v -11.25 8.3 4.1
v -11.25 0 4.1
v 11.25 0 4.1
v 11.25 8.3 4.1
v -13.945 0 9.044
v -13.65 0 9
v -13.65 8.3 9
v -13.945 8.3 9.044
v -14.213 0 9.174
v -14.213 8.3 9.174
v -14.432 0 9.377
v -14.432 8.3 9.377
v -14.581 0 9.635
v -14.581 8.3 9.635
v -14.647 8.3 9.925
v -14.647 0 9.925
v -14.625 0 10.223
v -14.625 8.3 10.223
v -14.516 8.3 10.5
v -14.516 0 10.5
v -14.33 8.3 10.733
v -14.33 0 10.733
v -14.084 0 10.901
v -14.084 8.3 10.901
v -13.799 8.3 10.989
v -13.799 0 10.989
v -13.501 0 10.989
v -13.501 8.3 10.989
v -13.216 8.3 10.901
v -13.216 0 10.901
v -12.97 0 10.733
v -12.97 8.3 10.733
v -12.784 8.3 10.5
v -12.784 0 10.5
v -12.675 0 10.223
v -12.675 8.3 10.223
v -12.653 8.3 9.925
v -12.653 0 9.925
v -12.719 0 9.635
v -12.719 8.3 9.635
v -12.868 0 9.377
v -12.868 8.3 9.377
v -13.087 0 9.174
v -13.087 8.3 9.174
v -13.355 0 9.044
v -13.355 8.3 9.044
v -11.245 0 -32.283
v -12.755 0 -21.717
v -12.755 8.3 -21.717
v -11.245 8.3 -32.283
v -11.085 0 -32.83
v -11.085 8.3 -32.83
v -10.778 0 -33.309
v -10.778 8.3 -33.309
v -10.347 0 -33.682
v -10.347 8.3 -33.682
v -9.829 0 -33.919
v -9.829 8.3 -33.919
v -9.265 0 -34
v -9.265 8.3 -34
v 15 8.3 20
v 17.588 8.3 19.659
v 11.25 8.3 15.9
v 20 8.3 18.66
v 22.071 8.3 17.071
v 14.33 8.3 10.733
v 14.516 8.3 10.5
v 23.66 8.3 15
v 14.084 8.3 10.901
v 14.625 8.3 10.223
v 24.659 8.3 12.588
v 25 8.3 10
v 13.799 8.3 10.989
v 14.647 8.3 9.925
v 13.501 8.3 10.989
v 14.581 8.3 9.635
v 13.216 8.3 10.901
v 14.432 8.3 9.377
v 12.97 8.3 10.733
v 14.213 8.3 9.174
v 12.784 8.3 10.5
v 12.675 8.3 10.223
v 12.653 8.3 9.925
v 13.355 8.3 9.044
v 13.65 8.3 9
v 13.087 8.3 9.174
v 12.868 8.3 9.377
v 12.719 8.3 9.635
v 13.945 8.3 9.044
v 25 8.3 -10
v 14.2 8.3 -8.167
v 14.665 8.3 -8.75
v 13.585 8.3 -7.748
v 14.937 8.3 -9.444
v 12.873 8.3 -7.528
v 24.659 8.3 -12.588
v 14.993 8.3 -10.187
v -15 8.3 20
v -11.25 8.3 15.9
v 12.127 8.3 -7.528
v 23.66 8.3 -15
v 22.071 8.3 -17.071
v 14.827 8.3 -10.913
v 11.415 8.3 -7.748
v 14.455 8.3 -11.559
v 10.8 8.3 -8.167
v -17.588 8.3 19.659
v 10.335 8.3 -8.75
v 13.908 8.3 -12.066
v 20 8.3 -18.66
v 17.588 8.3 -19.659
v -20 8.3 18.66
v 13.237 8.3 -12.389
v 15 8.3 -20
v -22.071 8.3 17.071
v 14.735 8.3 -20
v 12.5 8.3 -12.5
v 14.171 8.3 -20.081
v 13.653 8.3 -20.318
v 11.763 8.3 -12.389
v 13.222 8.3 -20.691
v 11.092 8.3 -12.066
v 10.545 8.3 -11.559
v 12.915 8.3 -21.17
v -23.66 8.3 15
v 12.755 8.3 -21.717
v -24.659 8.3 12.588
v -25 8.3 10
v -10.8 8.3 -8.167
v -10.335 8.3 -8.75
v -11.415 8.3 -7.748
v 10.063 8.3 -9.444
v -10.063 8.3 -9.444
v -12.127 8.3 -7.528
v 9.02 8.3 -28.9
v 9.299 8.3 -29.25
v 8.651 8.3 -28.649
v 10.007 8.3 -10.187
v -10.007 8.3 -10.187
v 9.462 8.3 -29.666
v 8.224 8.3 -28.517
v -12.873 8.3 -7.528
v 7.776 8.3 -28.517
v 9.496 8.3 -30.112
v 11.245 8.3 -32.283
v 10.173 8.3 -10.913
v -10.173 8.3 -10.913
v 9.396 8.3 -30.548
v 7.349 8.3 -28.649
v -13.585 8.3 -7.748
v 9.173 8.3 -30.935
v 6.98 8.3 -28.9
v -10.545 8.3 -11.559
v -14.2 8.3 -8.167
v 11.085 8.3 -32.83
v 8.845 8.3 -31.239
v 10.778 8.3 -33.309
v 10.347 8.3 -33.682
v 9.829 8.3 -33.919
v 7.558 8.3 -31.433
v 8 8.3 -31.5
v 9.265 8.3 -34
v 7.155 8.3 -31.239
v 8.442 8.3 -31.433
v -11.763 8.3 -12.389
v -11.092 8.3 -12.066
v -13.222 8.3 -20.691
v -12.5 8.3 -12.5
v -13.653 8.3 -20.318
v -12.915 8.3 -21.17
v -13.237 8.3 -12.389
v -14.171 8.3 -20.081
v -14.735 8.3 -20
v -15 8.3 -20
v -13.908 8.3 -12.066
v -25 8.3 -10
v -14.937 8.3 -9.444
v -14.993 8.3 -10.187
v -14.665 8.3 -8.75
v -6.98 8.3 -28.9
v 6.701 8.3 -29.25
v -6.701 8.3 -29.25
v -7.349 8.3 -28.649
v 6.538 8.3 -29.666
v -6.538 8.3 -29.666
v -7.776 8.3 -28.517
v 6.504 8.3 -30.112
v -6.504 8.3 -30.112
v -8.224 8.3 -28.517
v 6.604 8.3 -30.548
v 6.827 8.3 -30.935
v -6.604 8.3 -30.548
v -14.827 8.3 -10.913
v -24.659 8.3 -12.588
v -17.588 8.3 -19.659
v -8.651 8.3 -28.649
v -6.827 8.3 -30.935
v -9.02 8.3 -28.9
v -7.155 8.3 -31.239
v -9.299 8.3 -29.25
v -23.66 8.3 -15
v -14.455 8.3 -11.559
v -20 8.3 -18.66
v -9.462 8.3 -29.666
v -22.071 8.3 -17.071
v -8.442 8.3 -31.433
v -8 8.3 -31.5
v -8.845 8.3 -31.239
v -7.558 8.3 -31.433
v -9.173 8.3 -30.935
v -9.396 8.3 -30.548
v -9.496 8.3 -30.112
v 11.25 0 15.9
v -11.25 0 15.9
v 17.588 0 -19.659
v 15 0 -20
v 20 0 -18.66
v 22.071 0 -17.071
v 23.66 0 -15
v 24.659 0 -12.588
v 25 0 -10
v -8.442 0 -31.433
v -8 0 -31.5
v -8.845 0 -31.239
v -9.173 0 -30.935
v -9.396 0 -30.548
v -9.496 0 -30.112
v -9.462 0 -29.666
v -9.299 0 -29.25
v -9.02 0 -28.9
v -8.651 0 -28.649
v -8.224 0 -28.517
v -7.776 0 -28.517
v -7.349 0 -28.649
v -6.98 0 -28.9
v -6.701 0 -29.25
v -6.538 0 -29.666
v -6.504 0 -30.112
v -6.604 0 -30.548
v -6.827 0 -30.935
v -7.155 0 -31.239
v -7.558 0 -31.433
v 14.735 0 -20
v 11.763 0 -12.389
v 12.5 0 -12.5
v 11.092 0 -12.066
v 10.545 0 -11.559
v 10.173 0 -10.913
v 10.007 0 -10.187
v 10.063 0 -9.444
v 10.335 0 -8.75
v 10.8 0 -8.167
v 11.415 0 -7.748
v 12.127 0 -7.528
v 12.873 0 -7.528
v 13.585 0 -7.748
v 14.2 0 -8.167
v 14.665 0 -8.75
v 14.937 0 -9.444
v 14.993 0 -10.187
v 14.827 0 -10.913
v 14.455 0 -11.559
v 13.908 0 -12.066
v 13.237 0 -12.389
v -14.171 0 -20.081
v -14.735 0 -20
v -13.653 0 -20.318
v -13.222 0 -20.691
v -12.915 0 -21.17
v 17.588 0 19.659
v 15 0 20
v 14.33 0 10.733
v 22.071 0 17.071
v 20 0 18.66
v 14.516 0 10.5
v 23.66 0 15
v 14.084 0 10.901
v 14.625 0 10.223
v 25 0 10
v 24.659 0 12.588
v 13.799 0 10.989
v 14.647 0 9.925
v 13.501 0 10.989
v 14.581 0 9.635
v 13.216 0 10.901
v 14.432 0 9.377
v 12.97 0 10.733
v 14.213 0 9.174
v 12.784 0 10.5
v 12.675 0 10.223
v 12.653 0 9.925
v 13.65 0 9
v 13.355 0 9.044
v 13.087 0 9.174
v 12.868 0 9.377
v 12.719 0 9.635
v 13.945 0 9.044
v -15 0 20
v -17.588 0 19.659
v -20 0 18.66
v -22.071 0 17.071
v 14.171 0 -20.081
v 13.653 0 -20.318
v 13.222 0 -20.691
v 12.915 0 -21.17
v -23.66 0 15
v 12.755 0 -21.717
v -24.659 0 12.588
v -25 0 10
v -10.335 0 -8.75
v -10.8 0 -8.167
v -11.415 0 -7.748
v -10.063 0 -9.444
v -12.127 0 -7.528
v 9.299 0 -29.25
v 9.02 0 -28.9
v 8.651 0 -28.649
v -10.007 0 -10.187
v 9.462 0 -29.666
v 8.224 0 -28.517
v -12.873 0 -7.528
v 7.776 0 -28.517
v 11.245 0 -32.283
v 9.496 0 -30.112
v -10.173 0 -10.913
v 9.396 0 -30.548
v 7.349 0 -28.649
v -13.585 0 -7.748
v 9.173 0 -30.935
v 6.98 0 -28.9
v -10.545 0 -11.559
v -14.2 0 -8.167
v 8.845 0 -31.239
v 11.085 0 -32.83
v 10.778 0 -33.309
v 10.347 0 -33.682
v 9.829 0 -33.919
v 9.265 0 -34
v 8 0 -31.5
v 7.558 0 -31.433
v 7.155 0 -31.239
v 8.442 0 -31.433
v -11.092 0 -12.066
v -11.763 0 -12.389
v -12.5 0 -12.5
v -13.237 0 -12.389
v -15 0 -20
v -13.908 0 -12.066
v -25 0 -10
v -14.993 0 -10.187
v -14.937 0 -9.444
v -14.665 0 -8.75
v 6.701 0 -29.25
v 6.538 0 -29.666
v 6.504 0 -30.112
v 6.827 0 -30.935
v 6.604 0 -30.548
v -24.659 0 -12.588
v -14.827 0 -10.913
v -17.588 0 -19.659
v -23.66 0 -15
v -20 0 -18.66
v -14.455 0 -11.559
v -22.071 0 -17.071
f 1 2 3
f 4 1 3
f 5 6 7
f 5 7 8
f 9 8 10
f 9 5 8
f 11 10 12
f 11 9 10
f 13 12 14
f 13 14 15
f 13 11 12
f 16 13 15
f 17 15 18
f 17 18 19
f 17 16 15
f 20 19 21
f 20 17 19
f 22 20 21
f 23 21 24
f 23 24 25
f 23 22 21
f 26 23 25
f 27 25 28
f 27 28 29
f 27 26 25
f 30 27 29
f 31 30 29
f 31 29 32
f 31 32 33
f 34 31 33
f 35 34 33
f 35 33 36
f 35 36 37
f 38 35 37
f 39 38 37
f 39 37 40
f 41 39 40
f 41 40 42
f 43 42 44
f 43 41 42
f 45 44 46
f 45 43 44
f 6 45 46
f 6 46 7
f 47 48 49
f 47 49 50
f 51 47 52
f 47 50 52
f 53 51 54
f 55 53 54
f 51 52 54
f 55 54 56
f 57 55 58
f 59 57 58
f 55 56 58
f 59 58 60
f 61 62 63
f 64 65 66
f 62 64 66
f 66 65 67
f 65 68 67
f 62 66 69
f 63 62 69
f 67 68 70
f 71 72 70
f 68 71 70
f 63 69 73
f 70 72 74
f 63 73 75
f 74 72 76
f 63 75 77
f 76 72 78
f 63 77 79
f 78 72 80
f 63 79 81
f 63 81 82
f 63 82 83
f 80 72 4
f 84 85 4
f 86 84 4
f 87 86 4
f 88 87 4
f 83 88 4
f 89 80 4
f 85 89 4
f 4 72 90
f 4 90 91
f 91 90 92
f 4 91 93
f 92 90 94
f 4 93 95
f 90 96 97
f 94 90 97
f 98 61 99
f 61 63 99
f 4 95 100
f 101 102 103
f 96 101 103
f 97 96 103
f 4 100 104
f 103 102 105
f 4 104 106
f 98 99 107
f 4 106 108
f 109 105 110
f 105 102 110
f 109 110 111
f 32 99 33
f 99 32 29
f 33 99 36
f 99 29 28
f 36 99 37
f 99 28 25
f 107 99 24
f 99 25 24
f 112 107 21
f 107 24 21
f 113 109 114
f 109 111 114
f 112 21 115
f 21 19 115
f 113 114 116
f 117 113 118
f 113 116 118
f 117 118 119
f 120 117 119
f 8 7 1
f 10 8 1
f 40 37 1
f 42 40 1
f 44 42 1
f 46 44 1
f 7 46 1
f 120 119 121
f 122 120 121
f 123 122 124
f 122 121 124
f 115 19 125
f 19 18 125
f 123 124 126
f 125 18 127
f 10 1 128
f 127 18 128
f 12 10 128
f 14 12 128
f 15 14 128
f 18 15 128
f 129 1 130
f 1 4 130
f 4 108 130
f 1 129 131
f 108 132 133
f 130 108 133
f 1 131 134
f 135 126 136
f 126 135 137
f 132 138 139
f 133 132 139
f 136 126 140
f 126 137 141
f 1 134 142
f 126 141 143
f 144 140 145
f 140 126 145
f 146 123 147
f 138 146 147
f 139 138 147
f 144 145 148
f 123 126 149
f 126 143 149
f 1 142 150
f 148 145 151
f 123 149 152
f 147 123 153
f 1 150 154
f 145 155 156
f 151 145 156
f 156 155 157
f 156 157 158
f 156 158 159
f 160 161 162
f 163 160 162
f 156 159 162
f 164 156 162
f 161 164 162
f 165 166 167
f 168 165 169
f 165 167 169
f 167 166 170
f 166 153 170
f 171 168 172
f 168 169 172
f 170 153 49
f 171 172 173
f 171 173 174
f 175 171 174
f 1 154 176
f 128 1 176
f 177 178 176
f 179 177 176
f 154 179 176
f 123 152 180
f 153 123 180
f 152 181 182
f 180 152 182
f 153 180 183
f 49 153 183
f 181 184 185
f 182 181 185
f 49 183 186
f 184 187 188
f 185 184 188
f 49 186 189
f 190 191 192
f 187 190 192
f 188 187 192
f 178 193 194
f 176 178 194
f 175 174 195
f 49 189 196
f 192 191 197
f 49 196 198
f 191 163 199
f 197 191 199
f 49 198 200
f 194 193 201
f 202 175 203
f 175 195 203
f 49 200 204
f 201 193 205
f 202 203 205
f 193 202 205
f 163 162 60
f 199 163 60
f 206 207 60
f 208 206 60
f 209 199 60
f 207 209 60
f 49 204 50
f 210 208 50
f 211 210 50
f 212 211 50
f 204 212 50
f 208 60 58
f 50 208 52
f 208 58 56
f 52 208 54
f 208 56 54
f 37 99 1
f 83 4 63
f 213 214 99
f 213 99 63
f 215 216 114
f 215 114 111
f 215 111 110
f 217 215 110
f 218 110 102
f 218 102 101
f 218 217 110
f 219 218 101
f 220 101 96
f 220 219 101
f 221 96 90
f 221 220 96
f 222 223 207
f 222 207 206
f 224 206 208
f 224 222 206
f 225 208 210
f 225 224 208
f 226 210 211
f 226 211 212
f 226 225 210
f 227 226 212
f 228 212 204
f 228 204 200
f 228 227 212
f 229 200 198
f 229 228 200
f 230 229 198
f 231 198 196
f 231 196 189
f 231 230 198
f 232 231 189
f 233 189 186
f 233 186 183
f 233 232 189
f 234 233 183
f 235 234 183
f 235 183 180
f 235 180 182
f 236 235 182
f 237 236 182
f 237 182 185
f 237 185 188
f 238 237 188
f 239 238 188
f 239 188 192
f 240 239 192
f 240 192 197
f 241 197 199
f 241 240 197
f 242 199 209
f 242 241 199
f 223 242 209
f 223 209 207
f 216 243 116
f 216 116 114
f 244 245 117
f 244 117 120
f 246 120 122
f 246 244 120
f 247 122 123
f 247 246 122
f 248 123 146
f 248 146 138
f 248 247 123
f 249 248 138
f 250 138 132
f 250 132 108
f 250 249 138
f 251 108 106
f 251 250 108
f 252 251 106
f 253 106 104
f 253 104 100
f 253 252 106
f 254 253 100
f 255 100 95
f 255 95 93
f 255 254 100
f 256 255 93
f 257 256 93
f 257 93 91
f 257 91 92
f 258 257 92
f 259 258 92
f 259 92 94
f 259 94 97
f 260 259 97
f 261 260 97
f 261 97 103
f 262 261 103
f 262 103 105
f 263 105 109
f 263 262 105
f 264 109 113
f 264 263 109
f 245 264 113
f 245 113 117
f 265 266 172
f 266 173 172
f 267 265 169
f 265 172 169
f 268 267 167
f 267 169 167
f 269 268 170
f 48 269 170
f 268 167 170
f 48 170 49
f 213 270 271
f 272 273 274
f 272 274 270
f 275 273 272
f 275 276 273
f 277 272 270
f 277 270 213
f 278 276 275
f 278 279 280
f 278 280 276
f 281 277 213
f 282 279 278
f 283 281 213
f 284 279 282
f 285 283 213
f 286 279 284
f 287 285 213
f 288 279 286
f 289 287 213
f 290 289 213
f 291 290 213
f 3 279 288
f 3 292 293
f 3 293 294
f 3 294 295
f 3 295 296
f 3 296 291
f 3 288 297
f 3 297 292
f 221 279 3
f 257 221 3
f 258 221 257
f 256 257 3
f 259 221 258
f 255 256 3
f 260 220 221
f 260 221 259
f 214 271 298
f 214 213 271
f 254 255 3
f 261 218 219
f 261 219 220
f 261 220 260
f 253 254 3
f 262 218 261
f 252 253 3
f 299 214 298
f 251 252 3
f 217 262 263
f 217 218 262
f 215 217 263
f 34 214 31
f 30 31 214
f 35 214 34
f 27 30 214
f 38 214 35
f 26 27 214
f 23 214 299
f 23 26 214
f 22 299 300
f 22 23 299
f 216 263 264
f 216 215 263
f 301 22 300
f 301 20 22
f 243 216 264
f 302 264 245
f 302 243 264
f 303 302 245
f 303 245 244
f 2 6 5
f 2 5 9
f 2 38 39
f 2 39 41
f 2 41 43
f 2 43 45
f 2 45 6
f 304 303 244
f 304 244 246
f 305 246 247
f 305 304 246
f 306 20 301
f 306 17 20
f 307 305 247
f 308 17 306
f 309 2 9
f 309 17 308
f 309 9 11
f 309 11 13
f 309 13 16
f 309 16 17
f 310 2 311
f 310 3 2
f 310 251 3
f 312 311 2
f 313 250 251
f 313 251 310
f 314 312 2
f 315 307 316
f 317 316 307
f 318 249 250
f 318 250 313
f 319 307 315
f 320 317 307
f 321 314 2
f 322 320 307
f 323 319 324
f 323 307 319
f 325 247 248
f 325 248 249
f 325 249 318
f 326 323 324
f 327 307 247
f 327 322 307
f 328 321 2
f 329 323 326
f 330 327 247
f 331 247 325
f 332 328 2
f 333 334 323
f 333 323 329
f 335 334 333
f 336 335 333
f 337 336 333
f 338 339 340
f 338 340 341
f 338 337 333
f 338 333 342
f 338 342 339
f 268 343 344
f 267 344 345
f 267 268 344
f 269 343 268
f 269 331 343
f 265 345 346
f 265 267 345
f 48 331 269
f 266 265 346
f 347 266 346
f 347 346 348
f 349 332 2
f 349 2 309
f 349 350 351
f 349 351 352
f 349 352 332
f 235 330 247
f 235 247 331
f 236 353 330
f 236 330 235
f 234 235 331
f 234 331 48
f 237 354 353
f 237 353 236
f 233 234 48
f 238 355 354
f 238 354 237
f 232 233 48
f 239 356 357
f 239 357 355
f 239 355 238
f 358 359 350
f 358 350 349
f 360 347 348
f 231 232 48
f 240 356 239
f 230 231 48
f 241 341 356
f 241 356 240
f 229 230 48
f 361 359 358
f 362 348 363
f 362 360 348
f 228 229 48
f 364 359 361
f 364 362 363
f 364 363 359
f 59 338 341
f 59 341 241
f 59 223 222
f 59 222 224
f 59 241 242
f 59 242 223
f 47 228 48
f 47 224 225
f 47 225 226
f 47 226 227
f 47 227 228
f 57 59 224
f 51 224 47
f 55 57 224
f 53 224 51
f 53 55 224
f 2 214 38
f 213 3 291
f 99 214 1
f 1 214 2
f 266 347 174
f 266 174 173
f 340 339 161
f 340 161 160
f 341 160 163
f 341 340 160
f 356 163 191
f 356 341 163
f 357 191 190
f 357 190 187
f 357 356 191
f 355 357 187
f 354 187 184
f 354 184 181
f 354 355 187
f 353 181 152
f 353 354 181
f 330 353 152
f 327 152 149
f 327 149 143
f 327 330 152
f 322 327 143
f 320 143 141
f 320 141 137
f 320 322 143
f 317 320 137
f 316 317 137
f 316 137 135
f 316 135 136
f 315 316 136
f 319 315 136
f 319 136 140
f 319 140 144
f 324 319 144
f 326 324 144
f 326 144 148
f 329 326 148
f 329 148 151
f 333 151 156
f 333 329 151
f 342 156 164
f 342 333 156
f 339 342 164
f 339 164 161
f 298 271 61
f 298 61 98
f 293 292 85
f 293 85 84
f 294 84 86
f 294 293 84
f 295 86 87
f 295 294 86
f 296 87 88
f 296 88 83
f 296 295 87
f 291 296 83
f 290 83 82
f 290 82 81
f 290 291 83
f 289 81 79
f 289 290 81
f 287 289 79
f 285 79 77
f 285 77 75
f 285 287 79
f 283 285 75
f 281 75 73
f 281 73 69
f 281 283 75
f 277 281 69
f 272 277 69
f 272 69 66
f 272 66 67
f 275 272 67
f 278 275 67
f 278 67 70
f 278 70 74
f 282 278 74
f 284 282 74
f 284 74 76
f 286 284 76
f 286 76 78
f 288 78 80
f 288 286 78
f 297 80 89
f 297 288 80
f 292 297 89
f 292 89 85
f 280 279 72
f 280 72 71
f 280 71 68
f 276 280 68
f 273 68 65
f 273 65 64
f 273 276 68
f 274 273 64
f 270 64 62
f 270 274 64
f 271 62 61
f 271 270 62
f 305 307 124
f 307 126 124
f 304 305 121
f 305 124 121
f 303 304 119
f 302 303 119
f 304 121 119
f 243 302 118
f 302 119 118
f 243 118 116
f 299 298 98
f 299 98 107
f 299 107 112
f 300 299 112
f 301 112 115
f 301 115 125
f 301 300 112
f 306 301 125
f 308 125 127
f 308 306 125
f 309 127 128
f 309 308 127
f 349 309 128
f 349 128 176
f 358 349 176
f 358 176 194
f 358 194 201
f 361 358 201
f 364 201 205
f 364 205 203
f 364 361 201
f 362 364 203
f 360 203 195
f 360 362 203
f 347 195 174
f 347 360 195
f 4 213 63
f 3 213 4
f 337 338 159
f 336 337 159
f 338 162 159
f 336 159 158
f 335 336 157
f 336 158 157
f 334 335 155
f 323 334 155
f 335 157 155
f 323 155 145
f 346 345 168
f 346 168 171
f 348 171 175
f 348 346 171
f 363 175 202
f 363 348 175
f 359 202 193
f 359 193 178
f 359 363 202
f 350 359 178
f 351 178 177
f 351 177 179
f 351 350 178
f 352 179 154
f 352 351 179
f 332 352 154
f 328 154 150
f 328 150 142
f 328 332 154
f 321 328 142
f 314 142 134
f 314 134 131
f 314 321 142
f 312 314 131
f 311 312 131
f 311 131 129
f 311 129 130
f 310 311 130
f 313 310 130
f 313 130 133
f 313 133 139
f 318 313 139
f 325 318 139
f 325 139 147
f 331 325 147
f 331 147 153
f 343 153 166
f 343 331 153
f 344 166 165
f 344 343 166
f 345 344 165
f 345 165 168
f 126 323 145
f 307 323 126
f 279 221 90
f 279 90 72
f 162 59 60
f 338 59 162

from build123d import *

# Parameters (mm, degrees)
SKETCH1_R           = 2.5
SKETCH1_R_2         = 1
SKETCH1_R_3         = 1.5
SKETCH1_W           = 22.5
SKETCH1_H           = 11.8
BOSS_EXTRUDE1_DEPTH = 8.3
FILLET1_R           = 2


with BuildPart() as part:
    # Sketch1 → Boss-Extrude1 (new body)
    with BuildSketch(Plane(origin=(0, 0, 0), x_dir=(1, 0, 0), z_dir=(0, 1, 0))):
        with BuildLine():
            Line((-15, 20), (-13, 20))
            Line((-13, 20), (-11, 34))
            Line((-11, 34), (11, 34))
            Line((11, 34), (13, 20))
            Line((13, 20), (15, 20))
            ThreePointArc((15, 20), (22.071067812, 17.071067812), (25, 10))
            Line((25, 10), (25, -10))
            ThreePointArc((25, -10), (22.071067812, -17.071067812), (15, -20))
            Line((15, -20), (-15, -20))
            ThreePointArc((-15, -20), (-22.071067812, -17.071067812), (-25, -10))
            Line((-25, -10), (-25, 10))
            ThreePointArc((-25, 10), (-22.071067812, 17.071067812), (-15, 20))
        make_face()
        with Locations(Location((-12.5, 10, 0), (0, 0, 90))):
            Circle(SKETCH1_R, mode=Mode.SUBTRACT)
        with Locations(Location((12.5, 10, 0), (0, 0, 90))):
            Circle(SKETCH1_R, mode=Mode.SUBTRACT)
        with Locations(Location((13.65, -10, 0), (0, 0, 90))):
            Circle(SKETCH1_R_2, mode=Mode.SUBTRACT)
        with Locations(Location((-13.65, -10, 0), (0, 0, 90))):
            Circle(SKETCH1_R_2, mode=Mode.SUBTRACT)
        with Locations(Location((8, 30, 0), (0, 0, 90))):
            Circle(SKETCH1_R_3, mode=Mode.SUBTRACT)
        with Locations(Location((-8, 30, 0), (0, 0, 90))):
            Circle(SKETCH1_R_3, mode=Mode.SUBTRACT)
        with Locations((0, -10)):
            Rectangle(SKETCH1_W, SKETCH1_H, mode=Mode.SUBTRACT)
    extrude(amount=BOSS_EXTRUDE1_DEPTH)

    # Fillet1
    fillet1_edges = [part.edges().sort_by_distance(p)[0] for p in [
        (-13, 4.15, -20),
        (-11, 4.15, -34),
        (11, 4.15, -34),
        (13, 4.15, -20),
    ]]
    fillet(fillet1_edges, radius=FILLET1_R)


solid = part.part
